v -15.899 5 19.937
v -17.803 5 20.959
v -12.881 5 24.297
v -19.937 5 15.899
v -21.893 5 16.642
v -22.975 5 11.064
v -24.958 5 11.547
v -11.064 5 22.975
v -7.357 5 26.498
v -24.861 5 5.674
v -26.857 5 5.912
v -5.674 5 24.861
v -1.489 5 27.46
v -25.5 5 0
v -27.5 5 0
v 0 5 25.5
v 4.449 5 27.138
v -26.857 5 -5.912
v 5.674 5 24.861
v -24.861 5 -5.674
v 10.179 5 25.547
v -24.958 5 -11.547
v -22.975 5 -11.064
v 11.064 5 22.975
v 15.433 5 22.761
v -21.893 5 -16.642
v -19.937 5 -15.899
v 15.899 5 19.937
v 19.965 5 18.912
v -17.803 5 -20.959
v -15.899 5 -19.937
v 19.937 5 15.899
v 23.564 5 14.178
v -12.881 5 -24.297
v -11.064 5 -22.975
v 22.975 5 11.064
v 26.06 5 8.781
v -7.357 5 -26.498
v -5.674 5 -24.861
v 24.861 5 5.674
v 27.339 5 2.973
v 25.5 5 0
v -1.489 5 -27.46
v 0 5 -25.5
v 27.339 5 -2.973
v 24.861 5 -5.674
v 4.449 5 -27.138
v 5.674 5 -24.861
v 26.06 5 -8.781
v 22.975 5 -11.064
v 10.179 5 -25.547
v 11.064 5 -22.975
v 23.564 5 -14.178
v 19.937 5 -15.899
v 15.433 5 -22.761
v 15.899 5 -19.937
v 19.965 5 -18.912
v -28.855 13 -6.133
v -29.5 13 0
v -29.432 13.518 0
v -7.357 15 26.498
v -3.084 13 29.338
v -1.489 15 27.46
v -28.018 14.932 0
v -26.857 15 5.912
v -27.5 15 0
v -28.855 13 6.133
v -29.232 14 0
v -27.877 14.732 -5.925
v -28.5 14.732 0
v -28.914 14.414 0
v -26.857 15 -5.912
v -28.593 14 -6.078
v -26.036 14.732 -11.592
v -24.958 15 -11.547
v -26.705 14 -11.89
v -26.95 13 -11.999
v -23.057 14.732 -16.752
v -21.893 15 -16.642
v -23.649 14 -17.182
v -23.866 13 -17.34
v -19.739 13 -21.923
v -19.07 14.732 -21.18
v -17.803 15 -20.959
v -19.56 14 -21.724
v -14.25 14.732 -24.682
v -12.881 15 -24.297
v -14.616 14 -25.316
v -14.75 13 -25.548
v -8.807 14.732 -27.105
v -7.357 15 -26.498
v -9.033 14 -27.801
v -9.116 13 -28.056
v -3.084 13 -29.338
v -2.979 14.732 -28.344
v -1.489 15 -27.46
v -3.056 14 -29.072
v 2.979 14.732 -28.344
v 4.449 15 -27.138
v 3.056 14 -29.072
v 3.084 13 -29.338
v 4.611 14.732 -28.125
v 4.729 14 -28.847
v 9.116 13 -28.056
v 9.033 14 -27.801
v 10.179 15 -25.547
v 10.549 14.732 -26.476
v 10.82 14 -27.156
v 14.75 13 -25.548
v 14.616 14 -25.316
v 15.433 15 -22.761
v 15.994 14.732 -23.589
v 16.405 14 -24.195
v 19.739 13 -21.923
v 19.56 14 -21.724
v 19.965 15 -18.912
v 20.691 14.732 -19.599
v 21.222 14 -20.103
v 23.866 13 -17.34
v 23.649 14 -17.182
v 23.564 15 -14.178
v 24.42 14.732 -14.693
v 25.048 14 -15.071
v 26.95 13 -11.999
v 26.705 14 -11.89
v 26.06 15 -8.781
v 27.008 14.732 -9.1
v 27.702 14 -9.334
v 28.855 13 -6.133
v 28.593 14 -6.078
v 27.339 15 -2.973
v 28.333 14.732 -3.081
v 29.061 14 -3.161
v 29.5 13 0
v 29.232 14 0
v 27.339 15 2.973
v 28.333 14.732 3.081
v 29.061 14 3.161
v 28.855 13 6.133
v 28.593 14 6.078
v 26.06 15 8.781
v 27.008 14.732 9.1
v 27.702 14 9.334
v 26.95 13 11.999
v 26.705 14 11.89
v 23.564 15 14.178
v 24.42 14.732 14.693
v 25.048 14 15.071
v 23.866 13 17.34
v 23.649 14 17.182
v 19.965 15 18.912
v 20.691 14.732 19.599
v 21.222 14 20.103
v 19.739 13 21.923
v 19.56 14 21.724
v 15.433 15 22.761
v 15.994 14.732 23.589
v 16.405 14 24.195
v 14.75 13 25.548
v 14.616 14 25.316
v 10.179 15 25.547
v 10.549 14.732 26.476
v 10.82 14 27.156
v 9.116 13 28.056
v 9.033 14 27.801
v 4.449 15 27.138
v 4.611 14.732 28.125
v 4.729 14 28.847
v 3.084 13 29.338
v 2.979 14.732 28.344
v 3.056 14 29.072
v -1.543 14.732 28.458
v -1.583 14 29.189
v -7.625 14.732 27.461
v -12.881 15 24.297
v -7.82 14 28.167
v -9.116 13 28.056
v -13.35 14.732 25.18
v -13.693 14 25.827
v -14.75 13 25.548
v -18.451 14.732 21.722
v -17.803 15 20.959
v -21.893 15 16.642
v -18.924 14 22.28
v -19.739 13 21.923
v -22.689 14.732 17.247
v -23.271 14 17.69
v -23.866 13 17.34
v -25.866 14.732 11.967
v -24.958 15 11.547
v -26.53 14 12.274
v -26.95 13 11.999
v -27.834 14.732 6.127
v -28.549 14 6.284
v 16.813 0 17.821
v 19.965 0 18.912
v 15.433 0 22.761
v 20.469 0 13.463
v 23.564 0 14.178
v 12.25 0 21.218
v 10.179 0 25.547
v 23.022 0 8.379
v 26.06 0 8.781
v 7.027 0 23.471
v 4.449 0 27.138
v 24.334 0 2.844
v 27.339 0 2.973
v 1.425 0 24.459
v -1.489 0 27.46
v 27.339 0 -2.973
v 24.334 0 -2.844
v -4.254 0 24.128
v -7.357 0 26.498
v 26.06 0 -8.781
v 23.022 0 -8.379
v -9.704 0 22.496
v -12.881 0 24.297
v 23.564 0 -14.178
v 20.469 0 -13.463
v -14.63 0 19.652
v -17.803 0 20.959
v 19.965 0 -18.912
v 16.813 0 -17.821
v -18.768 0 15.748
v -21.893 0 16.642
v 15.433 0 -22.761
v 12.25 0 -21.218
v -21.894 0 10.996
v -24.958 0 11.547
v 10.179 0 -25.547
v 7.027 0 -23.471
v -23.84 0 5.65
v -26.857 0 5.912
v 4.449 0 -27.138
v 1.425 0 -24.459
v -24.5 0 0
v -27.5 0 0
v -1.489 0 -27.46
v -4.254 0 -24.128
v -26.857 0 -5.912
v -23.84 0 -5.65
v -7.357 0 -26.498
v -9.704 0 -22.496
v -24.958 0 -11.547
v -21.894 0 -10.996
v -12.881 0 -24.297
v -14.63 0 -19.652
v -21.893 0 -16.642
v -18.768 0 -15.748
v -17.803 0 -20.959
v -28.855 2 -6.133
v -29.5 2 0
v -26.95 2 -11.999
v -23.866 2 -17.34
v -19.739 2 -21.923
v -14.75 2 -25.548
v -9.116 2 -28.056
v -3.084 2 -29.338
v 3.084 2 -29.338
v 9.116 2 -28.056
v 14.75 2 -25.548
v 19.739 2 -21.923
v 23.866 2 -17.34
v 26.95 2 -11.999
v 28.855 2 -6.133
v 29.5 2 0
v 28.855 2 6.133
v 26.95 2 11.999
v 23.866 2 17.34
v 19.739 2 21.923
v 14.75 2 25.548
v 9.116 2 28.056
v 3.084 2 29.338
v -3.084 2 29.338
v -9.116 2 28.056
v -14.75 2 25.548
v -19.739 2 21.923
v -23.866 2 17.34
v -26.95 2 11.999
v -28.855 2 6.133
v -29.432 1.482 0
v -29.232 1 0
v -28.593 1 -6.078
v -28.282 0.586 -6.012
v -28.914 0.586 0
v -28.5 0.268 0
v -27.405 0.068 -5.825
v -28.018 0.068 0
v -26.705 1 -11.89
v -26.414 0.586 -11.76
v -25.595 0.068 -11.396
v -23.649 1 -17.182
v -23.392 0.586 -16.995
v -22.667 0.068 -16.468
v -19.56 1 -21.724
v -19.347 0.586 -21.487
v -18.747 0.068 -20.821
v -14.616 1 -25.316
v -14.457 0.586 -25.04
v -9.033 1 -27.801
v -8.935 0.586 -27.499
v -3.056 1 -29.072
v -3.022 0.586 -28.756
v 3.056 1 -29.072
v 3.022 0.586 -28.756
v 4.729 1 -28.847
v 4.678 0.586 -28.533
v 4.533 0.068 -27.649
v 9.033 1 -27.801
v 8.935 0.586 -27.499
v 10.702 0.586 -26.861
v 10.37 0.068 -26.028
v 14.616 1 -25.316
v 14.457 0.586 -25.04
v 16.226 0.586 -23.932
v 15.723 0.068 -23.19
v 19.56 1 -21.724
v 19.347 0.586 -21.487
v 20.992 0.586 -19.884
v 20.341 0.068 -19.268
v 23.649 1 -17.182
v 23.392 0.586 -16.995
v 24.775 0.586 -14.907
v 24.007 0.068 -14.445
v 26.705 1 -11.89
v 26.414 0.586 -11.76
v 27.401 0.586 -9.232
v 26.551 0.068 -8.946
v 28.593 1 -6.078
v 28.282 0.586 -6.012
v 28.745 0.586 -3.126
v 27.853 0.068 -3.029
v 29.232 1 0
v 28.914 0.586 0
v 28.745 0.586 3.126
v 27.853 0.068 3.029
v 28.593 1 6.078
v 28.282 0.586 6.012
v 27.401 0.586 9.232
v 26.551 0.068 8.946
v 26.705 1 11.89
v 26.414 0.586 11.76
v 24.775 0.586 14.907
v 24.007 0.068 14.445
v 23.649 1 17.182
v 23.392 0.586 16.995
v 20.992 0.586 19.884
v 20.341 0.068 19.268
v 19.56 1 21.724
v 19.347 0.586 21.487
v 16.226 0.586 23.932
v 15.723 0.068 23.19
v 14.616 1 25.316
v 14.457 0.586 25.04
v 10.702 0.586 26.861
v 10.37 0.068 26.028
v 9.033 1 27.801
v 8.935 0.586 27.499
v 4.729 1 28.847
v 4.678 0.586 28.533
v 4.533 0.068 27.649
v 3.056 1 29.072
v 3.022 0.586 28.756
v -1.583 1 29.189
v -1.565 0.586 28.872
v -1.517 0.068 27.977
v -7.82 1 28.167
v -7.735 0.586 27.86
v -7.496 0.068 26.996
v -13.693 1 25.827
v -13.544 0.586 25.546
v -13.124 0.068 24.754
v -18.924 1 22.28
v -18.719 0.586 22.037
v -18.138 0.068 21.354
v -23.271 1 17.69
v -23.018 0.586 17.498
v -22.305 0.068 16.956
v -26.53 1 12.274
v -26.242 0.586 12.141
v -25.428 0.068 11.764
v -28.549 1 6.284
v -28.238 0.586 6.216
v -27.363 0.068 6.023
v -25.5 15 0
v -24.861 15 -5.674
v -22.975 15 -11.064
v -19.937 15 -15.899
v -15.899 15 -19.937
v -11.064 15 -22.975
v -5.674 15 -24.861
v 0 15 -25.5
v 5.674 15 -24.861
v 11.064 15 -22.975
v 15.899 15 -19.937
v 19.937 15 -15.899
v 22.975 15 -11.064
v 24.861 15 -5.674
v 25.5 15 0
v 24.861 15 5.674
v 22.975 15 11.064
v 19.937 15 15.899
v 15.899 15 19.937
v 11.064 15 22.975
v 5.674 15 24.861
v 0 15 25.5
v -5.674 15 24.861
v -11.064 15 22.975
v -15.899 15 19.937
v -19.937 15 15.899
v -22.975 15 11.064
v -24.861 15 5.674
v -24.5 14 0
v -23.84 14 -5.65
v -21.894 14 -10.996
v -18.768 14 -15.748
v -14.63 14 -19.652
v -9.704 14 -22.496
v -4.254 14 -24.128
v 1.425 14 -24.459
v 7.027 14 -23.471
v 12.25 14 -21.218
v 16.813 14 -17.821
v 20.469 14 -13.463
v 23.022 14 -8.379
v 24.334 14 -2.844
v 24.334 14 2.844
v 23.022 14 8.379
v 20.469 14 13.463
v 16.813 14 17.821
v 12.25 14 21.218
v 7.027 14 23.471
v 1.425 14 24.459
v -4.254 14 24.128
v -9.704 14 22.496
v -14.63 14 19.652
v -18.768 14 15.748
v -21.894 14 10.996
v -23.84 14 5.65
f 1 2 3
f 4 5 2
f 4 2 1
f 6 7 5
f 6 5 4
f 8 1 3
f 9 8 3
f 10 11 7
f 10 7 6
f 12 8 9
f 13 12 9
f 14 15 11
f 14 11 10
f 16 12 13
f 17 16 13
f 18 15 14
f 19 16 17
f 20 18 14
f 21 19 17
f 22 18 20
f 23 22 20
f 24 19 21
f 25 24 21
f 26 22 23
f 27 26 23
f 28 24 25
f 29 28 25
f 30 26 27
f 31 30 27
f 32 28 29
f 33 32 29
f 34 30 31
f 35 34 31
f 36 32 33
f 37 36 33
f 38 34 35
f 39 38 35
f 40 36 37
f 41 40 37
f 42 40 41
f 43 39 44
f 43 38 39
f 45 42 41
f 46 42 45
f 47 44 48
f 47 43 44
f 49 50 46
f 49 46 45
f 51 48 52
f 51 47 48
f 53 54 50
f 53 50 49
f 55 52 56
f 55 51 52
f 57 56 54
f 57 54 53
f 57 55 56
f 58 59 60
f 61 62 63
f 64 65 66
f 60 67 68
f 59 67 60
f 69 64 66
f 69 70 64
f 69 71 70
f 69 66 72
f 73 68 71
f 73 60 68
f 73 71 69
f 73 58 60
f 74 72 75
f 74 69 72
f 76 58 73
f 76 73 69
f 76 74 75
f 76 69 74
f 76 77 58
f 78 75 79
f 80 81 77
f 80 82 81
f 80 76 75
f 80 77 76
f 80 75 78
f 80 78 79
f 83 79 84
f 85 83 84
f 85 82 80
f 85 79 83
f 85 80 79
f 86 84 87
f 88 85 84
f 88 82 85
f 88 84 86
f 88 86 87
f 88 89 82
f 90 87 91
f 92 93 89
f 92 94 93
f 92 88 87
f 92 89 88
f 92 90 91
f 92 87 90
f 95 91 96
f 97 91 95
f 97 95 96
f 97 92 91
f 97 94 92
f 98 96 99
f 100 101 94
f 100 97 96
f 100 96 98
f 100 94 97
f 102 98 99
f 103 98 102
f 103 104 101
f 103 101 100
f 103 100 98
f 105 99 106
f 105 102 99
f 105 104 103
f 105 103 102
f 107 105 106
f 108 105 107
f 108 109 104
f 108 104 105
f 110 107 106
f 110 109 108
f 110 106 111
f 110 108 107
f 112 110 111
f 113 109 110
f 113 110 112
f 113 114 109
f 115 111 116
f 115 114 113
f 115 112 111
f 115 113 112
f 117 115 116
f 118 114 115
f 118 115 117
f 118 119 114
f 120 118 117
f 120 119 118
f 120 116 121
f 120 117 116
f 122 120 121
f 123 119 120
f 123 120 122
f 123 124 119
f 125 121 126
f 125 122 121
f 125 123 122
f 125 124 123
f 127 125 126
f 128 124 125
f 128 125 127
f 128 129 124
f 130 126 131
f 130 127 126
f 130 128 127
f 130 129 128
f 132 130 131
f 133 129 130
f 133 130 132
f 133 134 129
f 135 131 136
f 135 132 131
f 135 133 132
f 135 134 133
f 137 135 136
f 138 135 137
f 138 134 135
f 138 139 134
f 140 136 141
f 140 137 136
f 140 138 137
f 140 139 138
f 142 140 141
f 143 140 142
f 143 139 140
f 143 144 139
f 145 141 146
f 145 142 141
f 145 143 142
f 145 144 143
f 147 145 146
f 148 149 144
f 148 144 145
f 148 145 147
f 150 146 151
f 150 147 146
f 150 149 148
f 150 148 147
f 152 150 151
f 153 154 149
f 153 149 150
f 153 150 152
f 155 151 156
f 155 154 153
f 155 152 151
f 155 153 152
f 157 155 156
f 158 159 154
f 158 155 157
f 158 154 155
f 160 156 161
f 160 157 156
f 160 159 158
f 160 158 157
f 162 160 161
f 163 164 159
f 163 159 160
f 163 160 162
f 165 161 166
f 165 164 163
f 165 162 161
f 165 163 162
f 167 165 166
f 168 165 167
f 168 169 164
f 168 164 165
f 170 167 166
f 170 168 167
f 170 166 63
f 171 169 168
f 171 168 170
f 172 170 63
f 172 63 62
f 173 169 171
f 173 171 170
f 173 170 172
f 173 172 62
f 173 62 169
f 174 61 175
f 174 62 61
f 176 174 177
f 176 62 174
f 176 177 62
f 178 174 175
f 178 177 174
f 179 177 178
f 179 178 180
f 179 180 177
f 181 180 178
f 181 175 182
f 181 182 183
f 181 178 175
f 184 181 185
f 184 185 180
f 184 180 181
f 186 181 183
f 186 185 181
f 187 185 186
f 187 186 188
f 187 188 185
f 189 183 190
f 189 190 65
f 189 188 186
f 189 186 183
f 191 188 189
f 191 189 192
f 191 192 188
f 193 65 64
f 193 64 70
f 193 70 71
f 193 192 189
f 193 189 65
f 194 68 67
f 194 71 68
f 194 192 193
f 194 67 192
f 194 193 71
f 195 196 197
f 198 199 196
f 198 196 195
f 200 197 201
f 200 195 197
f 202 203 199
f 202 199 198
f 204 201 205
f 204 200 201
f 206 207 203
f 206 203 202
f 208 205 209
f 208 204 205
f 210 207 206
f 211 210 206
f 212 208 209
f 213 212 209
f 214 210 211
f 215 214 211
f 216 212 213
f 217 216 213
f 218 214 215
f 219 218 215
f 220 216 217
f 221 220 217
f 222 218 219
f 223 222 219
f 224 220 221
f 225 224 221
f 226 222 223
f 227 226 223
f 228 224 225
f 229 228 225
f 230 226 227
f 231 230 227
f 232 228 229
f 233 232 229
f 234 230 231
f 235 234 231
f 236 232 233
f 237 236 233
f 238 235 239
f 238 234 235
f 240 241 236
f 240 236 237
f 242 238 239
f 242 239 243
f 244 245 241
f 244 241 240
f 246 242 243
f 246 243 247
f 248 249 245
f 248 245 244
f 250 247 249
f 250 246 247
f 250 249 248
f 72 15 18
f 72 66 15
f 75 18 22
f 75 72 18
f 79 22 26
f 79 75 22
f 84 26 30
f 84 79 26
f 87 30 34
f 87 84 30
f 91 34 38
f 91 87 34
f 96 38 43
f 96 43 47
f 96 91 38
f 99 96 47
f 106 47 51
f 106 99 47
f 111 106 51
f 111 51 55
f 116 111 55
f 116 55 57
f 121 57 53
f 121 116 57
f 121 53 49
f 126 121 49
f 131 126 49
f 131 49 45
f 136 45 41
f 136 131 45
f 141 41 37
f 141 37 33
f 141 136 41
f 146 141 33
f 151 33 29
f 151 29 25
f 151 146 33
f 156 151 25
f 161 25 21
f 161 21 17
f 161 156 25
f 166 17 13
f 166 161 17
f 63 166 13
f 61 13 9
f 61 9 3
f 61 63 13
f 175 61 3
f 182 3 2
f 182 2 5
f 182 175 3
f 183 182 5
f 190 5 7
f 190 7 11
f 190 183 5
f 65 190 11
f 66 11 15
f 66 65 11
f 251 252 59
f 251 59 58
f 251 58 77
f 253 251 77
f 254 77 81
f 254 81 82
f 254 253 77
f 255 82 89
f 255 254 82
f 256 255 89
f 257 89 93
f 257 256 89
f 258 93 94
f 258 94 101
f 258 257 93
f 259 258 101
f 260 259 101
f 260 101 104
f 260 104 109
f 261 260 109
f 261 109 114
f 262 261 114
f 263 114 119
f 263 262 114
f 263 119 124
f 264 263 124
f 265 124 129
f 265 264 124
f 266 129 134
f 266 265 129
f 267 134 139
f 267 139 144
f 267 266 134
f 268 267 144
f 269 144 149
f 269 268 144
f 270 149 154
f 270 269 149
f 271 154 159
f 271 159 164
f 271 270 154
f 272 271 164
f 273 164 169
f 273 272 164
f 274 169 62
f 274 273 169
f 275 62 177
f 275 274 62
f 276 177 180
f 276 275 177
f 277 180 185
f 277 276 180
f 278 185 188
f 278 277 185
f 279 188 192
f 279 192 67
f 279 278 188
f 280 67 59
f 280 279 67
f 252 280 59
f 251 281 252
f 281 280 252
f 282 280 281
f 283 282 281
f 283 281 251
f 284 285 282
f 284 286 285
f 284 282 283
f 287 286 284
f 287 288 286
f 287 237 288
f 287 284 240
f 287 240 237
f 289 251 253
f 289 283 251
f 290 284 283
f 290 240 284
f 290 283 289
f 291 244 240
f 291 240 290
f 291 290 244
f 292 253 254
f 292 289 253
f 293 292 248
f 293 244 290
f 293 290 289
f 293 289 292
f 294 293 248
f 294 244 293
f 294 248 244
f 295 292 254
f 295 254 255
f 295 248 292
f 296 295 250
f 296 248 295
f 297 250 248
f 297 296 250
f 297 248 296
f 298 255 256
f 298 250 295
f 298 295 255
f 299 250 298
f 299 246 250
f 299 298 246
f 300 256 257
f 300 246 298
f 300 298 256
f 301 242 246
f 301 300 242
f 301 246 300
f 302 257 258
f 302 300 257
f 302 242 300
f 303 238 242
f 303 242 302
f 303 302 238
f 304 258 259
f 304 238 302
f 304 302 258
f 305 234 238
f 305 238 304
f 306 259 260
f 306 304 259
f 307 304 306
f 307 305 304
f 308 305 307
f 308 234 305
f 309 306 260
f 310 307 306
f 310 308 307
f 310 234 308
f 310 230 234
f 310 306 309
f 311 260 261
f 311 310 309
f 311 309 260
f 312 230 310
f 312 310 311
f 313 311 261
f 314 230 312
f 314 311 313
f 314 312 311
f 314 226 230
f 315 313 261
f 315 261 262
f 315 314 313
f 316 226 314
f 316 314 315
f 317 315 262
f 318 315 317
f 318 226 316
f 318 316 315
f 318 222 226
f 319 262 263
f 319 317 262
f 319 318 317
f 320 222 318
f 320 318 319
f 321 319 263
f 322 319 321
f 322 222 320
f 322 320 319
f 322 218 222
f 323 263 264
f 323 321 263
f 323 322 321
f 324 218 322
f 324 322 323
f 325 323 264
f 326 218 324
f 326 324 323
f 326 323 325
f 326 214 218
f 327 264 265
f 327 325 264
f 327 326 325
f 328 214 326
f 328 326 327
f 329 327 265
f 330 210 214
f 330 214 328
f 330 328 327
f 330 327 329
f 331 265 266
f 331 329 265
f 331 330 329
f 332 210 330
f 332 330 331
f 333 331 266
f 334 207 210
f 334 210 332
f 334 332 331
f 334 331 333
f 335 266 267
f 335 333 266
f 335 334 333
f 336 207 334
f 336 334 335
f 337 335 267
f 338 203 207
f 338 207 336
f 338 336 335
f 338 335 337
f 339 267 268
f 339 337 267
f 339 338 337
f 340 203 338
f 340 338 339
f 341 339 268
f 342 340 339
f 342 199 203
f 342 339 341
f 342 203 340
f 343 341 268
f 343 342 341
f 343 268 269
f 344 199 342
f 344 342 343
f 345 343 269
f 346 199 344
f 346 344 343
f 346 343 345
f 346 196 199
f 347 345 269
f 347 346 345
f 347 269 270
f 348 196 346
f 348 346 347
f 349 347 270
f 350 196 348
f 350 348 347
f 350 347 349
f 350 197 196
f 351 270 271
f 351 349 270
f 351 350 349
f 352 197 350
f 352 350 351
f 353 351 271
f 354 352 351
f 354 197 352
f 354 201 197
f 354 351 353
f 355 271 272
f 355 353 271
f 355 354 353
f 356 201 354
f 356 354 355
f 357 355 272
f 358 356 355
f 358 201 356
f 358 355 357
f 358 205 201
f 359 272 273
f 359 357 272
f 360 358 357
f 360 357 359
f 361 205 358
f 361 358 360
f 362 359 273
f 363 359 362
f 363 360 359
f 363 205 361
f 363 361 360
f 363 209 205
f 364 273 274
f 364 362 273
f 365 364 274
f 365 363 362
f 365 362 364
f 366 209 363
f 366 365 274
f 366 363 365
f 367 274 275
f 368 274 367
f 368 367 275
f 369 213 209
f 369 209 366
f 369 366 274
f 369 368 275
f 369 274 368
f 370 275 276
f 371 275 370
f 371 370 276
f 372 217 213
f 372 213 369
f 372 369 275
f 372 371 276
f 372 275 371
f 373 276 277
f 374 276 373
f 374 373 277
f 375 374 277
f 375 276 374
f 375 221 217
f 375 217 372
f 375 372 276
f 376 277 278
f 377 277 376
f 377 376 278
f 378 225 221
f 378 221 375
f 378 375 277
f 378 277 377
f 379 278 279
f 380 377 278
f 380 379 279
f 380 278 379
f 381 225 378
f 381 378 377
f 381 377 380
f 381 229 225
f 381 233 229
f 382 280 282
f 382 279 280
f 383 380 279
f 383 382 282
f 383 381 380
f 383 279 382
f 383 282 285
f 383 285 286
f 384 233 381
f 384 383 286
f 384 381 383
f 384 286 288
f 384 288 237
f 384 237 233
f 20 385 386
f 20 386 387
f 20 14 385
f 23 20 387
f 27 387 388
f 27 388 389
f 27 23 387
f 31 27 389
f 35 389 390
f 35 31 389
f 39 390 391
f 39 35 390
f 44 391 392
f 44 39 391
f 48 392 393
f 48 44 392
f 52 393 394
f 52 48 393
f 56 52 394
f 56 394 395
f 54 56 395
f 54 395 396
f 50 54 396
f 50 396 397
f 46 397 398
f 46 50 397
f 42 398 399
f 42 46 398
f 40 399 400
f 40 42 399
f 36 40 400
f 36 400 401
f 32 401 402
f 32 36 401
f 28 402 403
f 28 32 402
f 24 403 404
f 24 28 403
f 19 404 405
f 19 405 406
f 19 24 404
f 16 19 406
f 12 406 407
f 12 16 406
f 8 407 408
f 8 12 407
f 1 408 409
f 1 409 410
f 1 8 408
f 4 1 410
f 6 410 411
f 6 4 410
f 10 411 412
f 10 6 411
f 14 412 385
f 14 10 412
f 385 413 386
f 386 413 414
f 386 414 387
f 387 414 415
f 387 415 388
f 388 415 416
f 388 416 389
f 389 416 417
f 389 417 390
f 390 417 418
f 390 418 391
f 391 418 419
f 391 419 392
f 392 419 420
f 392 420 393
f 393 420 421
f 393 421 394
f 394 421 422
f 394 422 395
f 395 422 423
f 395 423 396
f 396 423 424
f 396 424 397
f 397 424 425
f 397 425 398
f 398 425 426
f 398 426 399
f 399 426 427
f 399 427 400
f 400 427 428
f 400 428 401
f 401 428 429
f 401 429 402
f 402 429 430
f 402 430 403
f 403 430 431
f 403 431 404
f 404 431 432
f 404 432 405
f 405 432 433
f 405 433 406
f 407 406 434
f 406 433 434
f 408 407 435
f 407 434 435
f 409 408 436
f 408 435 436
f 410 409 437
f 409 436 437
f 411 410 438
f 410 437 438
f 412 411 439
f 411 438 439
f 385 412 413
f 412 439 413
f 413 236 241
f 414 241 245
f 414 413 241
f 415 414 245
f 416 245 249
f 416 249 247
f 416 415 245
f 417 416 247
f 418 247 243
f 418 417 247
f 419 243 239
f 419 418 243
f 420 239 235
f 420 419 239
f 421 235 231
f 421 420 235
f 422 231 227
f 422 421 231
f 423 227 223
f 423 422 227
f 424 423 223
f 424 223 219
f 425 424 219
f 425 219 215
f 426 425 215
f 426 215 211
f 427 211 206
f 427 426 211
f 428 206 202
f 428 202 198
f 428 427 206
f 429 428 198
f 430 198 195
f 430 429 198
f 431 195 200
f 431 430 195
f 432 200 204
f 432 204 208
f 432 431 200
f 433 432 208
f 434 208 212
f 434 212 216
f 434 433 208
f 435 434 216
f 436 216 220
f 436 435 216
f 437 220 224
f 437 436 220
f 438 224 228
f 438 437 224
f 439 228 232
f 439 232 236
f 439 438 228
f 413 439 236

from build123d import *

# Parameters (mm, degrees)
F2_R    = 1.99999
F3_SIZE = 0.99999


# Not quite as in the source:
# - a fillet or chamfer is up to 0.001 mm smaller than in the source, because OpenCascade refuses the exact size


with BuildPart() as f1:
    # F0 (on Top) → F1 (revolve)
    with BuildSketch(Plane.XY):
        Polygon((-24.5, 0), (-24.5, 14.3020306939), (-24.5, 15), (-25.5, 15), (-25.5, 5), (-27.5, 5), (-27.5, 15), (-29.5, 15), (-29.5, 0), align=None)
    revolve(axis=Axis((0, 7.5544440188, 0), (0, -1, 0)))

    # F2 (radius 2 in the source; OpenCascade refuses exactly that, so slightly less here)
    f2_edges = [f1.edges().sort_by_distance(p)[0] for p in [
        (29.5, 15, 0),
        (29.5, 0, 0),
    ]]
    fillet(f2_edges, radius=F2_R)

    # F3 (size 1 in the source; OpenCascade refuses exactly that, so slightly less here)
    f3_edges = [f1.edges().sort_by_distance(p)[0] for p in [
        (24.5, 15, 0),
    ]]
    chamfer(f3_edges, length=F3_SIZE)


solid = f1.part
